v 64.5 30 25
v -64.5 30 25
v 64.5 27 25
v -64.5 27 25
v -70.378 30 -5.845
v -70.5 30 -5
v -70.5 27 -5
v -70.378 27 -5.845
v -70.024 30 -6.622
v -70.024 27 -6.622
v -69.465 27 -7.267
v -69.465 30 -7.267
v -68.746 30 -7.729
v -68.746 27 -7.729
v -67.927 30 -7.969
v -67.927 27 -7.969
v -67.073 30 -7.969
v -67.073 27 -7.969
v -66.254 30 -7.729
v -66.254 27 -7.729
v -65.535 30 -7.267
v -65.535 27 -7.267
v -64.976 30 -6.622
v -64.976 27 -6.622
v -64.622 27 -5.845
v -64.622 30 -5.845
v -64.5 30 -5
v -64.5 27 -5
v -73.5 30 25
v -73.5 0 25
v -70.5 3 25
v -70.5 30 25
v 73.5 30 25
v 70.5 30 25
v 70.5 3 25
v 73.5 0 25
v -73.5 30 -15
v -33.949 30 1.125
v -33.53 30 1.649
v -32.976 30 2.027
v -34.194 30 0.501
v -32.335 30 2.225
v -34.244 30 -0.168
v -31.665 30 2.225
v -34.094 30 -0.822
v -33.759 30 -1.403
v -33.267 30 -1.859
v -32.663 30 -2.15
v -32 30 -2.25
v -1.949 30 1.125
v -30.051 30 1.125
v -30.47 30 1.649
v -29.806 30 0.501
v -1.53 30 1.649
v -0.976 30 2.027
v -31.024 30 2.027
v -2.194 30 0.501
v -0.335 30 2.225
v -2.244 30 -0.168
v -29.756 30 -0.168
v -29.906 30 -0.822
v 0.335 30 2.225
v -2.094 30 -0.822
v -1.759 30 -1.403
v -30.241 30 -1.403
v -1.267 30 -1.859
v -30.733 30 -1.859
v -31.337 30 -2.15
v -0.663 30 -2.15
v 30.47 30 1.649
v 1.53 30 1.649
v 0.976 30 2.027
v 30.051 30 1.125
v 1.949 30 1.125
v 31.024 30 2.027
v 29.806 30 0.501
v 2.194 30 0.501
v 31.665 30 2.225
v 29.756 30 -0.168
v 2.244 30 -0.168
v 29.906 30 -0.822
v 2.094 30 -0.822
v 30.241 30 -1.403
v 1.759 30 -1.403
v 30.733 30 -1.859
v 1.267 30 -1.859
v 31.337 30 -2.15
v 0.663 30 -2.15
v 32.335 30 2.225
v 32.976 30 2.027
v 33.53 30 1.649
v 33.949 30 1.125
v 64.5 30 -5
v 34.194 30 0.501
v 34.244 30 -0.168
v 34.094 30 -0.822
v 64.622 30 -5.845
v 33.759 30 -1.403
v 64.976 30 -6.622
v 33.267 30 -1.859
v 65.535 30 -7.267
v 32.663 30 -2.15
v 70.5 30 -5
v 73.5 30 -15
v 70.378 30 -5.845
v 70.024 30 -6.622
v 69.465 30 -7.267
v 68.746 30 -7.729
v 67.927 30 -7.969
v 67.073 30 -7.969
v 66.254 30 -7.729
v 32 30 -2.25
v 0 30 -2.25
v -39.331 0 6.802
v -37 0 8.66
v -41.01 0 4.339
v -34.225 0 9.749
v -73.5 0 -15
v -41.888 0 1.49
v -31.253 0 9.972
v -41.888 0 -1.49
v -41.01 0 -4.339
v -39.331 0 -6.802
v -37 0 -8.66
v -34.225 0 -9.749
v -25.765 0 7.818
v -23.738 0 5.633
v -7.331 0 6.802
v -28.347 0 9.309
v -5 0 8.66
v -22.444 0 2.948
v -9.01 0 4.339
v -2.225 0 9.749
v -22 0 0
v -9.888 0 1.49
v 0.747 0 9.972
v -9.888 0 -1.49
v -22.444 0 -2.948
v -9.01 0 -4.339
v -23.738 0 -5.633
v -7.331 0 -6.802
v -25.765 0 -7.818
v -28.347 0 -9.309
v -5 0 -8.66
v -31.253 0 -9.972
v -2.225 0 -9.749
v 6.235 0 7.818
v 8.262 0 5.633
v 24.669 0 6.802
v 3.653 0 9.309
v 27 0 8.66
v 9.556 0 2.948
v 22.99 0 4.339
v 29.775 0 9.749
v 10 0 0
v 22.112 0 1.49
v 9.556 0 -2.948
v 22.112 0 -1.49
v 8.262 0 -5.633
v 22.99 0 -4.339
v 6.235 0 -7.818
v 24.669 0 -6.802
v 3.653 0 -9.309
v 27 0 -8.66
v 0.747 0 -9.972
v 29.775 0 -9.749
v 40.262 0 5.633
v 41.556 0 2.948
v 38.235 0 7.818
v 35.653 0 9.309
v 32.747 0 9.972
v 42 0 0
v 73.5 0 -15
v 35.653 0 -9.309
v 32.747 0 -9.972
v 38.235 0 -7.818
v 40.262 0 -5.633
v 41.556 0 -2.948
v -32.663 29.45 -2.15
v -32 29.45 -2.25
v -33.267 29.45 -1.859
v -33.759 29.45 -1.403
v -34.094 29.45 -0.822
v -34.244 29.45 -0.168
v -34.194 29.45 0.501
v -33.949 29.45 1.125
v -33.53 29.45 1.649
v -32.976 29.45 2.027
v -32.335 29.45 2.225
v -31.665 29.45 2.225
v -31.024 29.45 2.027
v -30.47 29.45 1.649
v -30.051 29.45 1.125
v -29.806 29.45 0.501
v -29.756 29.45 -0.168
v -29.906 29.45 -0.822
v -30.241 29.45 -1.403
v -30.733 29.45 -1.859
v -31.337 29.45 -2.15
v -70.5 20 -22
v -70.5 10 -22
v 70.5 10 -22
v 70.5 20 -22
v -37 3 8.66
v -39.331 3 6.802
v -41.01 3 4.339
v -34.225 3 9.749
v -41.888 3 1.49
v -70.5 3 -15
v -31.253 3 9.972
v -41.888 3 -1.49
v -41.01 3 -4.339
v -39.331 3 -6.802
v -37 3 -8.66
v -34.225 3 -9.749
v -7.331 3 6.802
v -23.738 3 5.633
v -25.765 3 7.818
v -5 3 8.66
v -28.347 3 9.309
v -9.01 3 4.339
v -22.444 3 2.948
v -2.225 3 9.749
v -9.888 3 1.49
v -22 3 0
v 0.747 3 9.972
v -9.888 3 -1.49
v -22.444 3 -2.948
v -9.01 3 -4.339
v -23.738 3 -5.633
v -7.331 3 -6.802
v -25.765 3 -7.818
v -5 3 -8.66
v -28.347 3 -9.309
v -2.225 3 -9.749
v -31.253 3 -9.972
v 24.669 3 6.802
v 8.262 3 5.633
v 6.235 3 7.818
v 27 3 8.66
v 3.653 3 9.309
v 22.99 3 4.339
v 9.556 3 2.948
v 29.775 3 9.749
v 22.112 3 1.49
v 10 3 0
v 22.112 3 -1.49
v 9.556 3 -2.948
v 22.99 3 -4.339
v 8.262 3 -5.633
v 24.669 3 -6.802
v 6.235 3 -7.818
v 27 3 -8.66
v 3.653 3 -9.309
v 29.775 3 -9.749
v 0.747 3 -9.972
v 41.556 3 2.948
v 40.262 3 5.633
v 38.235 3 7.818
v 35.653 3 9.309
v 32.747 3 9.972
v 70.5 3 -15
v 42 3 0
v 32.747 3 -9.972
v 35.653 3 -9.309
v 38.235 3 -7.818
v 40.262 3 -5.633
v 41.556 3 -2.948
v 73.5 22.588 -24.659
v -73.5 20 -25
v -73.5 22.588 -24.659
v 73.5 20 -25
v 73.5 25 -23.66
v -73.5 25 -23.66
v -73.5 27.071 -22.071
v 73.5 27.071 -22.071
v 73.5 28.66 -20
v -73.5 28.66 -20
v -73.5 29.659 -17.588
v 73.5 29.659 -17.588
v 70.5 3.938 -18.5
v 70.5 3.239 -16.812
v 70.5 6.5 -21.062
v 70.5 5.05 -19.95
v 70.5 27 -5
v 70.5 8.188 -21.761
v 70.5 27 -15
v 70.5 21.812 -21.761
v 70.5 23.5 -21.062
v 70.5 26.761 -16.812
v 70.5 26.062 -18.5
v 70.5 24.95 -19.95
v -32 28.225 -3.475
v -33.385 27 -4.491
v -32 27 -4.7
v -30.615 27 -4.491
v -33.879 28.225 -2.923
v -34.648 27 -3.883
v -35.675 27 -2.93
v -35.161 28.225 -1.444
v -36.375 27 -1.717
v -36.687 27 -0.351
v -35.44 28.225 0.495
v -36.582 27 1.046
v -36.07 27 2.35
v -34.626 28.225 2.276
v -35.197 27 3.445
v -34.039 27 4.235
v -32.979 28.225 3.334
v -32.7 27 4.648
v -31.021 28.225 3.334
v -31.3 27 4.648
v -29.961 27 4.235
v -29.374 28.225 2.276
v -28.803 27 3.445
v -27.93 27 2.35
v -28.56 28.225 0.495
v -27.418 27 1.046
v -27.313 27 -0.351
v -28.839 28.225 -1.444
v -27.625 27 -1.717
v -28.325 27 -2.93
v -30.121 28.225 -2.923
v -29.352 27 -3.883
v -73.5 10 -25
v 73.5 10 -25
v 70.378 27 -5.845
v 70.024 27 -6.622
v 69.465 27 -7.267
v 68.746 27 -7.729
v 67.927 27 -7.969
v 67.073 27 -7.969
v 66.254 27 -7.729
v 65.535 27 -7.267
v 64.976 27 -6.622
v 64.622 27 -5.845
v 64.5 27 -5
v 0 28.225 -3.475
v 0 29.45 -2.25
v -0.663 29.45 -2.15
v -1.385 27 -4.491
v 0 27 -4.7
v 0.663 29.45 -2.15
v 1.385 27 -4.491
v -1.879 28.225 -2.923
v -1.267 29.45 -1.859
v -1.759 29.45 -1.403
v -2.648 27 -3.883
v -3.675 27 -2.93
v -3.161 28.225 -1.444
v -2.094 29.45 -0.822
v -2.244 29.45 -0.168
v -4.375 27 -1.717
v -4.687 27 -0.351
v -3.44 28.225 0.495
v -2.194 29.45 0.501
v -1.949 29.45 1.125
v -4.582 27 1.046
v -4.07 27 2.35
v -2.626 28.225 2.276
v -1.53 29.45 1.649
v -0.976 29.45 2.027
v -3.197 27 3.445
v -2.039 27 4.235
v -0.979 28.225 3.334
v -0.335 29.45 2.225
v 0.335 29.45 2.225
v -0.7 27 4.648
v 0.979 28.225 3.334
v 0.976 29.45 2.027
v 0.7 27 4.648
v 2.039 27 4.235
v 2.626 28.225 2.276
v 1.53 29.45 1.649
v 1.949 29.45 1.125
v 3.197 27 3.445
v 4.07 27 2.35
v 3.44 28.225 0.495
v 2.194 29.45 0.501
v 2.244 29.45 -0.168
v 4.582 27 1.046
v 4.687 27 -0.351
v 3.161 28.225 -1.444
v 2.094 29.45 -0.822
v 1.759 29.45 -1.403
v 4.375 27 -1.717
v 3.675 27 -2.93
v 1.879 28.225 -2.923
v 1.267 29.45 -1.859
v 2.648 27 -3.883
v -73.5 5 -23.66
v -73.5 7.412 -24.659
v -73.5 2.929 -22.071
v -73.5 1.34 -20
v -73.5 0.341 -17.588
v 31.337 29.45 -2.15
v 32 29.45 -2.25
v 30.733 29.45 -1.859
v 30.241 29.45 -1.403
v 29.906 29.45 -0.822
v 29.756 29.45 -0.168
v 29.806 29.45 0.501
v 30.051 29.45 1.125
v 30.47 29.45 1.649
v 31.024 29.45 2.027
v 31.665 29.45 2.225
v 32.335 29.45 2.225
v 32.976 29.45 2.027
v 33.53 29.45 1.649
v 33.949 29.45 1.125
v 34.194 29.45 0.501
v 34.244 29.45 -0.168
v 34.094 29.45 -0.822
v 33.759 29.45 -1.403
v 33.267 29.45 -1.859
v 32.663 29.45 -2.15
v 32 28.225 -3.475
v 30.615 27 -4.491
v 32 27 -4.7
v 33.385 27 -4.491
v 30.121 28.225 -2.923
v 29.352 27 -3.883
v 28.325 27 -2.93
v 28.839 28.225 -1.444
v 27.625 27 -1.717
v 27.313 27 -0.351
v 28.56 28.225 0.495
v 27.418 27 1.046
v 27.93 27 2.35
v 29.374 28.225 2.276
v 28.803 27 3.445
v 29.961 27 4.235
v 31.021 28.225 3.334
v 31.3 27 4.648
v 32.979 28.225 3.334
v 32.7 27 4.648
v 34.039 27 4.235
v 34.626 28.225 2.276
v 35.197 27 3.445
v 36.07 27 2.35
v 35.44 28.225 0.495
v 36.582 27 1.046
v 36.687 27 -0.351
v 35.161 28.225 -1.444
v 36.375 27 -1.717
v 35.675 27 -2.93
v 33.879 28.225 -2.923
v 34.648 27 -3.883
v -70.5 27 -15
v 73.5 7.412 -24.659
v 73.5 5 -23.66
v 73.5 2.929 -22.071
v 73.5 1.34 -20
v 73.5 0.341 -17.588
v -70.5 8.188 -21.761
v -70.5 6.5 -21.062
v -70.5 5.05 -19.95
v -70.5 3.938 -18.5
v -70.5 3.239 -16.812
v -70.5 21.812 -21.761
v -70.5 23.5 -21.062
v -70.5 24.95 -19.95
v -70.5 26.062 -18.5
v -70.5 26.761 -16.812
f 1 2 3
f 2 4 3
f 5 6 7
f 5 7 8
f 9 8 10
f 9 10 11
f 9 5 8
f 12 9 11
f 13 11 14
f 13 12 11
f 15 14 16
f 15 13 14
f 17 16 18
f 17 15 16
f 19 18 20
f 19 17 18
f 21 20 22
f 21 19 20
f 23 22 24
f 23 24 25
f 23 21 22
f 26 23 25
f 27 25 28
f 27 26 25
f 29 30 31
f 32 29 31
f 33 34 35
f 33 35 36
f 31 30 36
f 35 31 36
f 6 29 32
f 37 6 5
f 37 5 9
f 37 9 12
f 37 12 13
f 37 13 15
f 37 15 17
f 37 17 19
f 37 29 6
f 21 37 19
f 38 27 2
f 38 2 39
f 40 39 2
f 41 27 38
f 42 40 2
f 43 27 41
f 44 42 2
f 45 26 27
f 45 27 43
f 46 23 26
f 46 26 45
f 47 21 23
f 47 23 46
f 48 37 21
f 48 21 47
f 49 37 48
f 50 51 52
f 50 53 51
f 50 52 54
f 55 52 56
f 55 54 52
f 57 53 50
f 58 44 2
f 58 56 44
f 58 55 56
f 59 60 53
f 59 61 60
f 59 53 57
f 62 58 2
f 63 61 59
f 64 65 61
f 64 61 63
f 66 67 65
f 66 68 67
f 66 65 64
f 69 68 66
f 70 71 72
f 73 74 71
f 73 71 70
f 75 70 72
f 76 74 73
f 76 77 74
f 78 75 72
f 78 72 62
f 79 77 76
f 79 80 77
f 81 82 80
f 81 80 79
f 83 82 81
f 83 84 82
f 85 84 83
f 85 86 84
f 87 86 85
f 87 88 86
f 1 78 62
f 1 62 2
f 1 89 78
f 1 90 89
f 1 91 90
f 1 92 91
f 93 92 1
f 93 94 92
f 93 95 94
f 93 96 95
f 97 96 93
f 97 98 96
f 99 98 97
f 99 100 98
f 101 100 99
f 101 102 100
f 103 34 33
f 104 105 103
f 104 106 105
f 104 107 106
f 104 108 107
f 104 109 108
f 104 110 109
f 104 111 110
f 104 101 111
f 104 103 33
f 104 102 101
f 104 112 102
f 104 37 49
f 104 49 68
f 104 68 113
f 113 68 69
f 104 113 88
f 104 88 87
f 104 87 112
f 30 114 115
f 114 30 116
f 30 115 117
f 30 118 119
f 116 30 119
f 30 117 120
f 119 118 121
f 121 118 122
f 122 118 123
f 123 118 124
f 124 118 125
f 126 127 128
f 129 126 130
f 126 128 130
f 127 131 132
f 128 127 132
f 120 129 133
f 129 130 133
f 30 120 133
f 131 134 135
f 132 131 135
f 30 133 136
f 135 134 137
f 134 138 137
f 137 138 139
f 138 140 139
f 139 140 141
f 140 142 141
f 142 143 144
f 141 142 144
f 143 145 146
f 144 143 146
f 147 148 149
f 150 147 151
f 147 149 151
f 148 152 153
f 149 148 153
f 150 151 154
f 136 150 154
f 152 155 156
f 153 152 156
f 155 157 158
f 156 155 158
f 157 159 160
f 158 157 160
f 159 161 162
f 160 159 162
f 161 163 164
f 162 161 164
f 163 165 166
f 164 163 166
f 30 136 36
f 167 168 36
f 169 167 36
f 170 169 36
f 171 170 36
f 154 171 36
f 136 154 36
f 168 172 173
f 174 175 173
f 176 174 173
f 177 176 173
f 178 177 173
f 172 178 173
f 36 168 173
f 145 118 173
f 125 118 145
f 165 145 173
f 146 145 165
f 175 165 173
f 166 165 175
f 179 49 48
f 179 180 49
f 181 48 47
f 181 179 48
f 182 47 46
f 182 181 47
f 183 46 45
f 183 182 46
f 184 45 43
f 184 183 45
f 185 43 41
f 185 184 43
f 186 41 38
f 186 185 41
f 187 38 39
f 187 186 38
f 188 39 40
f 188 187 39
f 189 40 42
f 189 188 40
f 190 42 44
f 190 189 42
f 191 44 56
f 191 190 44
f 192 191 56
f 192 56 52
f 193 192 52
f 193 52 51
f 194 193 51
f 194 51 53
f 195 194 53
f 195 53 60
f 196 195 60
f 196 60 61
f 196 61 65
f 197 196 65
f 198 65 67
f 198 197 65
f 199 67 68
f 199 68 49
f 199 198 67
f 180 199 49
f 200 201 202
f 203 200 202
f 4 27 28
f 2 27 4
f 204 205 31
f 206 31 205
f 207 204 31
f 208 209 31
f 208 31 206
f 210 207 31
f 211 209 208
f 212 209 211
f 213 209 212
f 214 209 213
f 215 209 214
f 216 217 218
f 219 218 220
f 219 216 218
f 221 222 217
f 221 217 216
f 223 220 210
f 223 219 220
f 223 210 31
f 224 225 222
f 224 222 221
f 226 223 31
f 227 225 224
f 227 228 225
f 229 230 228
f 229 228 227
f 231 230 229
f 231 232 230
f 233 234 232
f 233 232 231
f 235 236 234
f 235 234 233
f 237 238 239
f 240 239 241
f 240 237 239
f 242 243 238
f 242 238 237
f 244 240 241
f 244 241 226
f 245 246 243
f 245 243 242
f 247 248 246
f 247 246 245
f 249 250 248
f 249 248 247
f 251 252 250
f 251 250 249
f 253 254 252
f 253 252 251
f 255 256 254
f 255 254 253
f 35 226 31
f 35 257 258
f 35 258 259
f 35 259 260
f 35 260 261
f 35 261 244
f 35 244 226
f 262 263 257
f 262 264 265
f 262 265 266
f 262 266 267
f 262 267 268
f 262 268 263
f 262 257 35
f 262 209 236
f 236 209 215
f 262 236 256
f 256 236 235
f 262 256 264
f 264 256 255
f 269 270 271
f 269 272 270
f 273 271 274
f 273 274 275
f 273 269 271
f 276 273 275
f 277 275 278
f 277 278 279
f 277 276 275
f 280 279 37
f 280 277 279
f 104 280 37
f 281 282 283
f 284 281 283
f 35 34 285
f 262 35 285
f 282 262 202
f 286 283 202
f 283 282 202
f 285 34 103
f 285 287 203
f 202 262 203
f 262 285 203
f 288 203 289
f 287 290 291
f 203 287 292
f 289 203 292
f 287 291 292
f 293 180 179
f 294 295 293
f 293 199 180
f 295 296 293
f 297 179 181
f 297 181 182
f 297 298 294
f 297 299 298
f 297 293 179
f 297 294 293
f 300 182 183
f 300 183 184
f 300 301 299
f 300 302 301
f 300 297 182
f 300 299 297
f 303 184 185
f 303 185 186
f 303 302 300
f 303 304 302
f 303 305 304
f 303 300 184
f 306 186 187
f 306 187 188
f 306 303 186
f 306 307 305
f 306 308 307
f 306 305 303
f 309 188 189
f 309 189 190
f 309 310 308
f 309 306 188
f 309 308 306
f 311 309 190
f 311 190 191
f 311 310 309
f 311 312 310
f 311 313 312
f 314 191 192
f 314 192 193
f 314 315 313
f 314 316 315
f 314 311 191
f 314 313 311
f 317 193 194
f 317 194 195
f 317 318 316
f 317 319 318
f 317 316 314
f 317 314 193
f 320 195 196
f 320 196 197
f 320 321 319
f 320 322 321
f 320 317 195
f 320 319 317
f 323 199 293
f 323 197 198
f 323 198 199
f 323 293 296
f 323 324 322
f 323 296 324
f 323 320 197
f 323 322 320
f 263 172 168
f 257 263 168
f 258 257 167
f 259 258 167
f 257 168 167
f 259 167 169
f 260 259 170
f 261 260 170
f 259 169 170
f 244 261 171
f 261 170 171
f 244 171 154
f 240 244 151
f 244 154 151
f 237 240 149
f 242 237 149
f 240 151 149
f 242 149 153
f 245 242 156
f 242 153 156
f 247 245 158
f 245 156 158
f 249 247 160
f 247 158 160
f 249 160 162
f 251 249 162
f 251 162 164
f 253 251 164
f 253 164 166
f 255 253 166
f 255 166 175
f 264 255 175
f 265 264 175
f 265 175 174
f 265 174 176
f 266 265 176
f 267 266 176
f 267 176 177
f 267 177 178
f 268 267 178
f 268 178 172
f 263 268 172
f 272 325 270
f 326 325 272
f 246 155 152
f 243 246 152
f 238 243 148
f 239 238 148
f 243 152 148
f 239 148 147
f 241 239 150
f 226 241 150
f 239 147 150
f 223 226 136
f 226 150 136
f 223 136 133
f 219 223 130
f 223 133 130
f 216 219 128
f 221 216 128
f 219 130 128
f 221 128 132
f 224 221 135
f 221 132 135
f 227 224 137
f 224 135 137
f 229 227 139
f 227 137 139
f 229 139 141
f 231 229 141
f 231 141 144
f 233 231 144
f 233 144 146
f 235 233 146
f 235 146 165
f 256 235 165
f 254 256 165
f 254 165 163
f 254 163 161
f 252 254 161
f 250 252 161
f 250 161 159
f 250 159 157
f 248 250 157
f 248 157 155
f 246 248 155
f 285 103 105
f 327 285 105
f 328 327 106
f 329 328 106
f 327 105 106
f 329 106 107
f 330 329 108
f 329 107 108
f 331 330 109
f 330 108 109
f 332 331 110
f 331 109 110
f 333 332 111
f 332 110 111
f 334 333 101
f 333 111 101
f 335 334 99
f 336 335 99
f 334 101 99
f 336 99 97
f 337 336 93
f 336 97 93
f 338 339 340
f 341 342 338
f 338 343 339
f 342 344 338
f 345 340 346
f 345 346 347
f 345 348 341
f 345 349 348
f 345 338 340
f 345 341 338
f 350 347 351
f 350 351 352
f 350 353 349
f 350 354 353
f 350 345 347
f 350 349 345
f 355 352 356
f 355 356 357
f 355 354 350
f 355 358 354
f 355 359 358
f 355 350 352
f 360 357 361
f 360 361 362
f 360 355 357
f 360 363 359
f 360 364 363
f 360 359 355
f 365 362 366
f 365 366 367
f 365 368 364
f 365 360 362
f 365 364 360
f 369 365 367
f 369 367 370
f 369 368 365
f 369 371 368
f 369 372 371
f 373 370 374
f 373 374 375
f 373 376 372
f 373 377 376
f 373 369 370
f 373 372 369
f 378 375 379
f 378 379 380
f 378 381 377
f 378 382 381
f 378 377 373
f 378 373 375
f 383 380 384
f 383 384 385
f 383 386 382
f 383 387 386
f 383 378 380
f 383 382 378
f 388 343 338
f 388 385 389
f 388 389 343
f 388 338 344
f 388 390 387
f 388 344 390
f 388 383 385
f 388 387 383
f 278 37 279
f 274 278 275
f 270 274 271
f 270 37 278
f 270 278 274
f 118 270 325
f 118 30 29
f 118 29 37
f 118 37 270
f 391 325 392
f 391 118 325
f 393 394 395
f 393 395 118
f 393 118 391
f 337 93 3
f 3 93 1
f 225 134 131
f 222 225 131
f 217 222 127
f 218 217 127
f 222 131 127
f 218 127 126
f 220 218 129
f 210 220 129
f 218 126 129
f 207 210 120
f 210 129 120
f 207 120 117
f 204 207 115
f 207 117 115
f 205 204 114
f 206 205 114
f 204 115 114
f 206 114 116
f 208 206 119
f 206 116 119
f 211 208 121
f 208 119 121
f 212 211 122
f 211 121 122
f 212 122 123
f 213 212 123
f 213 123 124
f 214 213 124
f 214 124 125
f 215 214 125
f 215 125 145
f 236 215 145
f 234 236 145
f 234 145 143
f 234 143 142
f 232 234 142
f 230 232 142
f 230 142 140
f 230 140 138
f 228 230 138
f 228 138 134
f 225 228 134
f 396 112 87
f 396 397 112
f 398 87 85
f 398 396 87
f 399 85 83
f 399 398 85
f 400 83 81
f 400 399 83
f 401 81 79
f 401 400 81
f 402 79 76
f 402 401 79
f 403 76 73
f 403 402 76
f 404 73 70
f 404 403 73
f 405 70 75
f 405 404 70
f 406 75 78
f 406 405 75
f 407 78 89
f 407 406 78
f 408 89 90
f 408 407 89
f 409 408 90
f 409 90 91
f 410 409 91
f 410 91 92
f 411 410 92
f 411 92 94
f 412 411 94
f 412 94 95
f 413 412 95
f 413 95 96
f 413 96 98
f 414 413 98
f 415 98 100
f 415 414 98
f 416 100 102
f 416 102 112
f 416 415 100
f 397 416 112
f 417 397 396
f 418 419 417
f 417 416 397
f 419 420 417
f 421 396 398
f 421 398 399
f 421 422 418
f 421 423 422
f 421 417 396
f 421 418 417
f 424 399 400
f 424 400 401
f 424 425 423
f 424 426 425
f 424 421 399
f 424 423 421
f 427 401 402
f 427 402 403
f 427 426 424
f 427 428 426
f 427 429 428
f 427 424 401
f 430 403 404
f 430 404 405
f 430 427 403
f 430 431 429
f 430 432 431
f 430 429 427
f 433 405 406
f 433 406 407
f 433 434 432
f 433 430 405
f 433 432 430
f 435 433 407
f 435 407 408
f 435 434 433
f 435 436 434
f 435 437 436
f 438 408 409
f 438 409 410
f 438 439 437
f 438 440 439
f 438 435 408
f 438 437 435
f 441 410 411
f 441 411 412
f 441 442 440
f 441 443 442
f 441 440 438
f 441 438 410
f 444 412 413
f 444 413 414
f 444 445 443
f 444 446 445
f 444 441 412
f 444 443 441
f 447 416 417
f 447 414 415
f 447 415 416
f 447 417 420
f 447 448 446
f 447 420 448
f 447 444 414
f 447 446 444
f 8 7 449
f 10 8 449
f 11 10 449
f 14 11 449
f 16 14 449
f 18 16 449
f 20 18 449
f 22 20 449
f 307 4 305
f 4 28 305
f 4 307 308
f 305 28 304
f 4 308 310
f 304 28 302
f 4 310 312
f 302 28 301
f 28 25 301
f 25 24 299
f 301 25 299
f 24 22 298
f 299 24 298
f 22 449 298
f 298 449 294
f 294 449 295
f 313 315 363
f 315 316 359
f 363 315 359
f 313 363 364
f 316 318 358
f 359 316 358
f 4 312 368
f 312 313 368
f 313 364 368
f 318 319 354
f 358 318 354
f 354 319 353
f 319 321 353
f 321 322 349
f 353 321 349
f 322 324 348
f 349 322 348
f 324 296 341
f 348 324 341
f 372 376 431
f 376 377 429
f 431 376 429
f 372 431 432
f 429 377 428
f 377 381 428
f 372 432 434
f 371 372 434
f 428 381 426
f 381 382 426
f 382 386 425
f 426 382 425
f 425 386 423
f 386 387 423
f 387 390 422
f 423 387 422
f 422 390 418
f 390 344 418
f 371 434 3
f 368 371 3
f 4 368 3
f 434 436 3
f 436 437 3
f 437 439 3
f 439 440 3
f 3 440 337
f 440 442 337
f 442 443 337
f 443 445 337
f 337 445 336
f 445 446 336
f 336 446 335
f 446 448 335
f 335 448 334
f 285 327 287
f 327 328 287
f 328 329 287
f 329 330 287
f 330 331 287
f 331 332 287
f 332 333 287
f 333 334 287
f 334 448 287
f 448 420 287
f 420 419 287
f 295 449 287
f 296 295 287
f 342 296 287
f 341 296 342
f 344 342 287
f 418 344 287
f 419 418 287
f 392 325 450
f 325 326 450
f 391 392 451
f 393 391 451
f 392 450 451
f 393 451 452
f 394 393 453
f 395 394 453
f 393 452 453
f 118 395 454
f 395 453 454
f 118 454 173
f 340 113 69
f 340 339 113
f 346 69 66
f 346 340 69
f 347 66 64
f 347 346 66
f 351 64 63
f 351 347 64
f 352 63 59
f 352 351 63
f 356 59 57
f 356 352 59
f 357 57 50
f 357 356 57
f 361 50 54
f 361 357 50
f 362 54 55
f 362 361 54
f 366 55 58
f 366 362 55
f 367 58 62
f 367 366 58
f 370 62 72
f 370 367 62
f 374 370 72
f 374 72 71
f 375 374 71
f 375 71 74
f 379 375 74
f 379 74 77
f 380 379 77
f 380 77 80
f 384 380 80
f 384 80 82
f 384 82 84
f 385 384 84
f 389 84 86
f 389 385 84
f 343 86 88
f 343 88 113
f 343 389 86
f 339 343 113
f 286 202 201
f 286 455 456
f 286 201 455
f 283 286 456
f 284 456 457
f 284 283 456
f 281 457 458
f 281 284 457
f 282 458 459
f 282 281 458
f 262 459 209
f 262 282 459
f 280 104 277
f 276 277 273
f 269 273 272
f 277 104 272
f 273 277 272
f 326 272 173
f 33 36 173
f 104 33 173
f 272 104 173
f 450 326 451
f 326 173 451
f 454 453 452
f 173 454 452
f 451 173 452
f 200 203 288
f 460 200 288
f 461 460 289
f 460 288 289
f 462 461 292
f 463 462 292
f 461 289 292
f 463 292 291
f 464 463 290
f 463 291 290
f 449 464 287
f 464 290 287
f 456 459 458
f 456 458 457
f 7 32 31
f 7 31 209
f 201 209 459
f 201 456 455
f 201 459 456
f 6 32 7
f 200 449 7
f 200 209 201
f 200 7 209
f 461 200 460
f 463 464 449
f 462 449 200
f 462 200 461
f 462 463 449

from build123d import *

# Parameters (mm, degrees)
SKETCH1_W                                    = 147
SKETCH1_H                                    = 50
BOSS_EXTRUDE1_DEPTH                          = 30
FILLET1_R                                    = 10
SHELL1_T                                     = -3
CUT_EXTRUDE1_DEPTH                           = 3
CSK_FOR_M4_COUNTERSUNK_FLAT_HEAD_SCR_2_COUNT = 2
CSK_FOR_M4_COUNTERSUNK_FLAT_HEAD_SCR_2_PITCH = 32
CSK_FOR_M4_COUNTERSUNK_FLAT_HEAD_SCR_3_COUNT = 2
CSK_FOR_M4_COUNTERSUNK_FLAT_HEAD_SCR_3_PITCH = 64
CUT_EXTRUDE2_REACH                           = 32
SKETCH5_R                                    = 10


with BuildPart() as part:
    # Sketch1 → Boss-Extrude1 (new body)
    with BuildSketch(Plane(origin=(0, 0, 0), x_dir=(1, 0, 0), z_dir=(0, 1, 0))):
        Rectangle(SKETCH1_W, SKETCH1_H)
    extrude(amount=BOSS_EXTRUDE1_DEPTH)

    # Fillet1
    fillet1_edges = [part.edges().sort_by_distance(p)[0] for p in [
        (0, 0, -25),
        (0, 30, -25),
    ]]
    fillet(fillet1_edges, radius=FILLET1_R)

    # Shell1
    shell1_openings = [part.faces().sort_by_distance(p)[0] for p in [
        (0, 15, 25),
    ]]
    offset(amount=SHELL1_T, openings=shell1_openings, kind=Kind.INTERSECTION)

    # Sketch2 → Cut-Extrude1 (cut)
    with BuildSketch(Plane(origin=(0, 30, 0), x_dir=(1, 0, 0), z_dir=(0, 1, 0))):
        with BuildLine():
            Line((-70.5, -25), (-70.5, 5))
            ThreePointArc((-70.5, 5), (-67.5, 8), (-64.5, 5))
            Line((-64.5, 5), (-64.5, -25))
            Line((-64.5, -25), (-70.5, -25))
        make_face()
    cut_extrude1 = extrude(amount=-CUT_EXTRUDE1_DEPTH, mode=Mode.SUBTRACT)

    # Mirror1: Cut-Extrude1 across plane
    add(cut_extrude1.mirror(Plane(origin=(0, 0, 0), x_dir=(0, 0, 1), z_dir=(1, 0, 0))), mode=Mode.SUBTRACT)

    # Sketch3 → CSK for M4 Countersunk Flat Head Screw1 (revolve, cut)
    with BuildSketch(Plane(origin=(-32, 27, 0), x_dir=(0, 0, -1), z_dir=(1, 0, 0))):
        Polygon((0, 0), (0, 3), (2.25, 3), (2.25, 2.45), (4.7, 0), align=None)
    csk_for_m4_countersunk_flat_head_screw1 = revolve(axis=Axis((-32, 20.65, 0), (0, 1, 0)), mode=Mode.SUBTRACT)

    # CSK for M4 Countersunk Flat Head Scr 2: CSK for M4 Countersunk Flat Head Screw1 ×2
    with Locations(*[(i * CSK_FOR_M4_COUNTERSUNK_FLAT_HEAD_SCR_2_PITCH, 0, 0) for i in range(1, CSK_FOR_M4_COUNTERSUNK_FLAT_HEAD_SCR_2_COUNT)]):
        add(csk_for_m4_countersunk_flat_head_screw1, mode=Mode.SUBTRACT)

    # CSK for M4 Countersunk Flat Head Scr 3: CSK for M4 Countersunk Flat Head Screw1 ×2
    with Locations(*[(i * CSK_FOR_M4_COUNTERSUNK_FLAT_HEAD_SCR_3_PITCH, 0, 0) for i in range(1, CSK_FOR_M4_COUNTERSUNK_FLAT_HEAD_SCR_3_COUNT)]):
        add(csk_for_m4_countersunk_flat_head_screw1, mode=Mode.SUBTRACT)

    # Sketch5 → Cut-Extrude2 (cut, up to next)
    with BuildSketch(Plane.XZ, mode=Mode.PRIVATE) as cut_extrude2_sk1:
        Circle(SKETCH5_R)
    cut_extrude2_tool1 = extrude(cut_extrude2_sk1.sketch, amount=-CUT_EXTRUDE2_REACH, mode=Mode.PRIVATE) & part.part
    add(cut_extrude2_tool1.solids().sort_by_distance((0, 0, 0))[0], mode=Mode.SUBTRACT)
    # Sketch5 → Cut-Extrude2 (cut, up to next)
    with BuildSketch(Plane.XZ, mode=Mode.PRIVATE) as cut_extrude2_sk2:
        with Locations((-32, 0)):
            Circle(SKETCH5_R)
    cut_extrude2_tool2 = extrude(cut_extrude2_sk2.sketch, amount=-CUT_EXTRUDE2_REACH, mode=Mode.PRIVATE) & part.part
    add(cut_extrude2_tool2.solids().sort_by_distance((-32, 0, 0))[0], mode=Mode.SUBTRACT)
    # Sketch5 → Cut-Extrude2 (cut, up to next)
    with BuildSketch(Plane.XZ, mode=Mode.PRIVATE) as cut_extrude2_sk3:
        with Locations((32, 0)):
            Circle(SKETCH5_R)
    cut_extrude2_tool3 = extrude(cut_extrude2_sk3.sketch, amount=-CUT_EXTRUDE2_REACH, mode=Mode.PRIVATE) & part.part
    add(cut_extrude2_tool3.solids().sort_by_distance((32, 0, 0))[0], mode=Mode.SUBTRACT)


solid = part.part
